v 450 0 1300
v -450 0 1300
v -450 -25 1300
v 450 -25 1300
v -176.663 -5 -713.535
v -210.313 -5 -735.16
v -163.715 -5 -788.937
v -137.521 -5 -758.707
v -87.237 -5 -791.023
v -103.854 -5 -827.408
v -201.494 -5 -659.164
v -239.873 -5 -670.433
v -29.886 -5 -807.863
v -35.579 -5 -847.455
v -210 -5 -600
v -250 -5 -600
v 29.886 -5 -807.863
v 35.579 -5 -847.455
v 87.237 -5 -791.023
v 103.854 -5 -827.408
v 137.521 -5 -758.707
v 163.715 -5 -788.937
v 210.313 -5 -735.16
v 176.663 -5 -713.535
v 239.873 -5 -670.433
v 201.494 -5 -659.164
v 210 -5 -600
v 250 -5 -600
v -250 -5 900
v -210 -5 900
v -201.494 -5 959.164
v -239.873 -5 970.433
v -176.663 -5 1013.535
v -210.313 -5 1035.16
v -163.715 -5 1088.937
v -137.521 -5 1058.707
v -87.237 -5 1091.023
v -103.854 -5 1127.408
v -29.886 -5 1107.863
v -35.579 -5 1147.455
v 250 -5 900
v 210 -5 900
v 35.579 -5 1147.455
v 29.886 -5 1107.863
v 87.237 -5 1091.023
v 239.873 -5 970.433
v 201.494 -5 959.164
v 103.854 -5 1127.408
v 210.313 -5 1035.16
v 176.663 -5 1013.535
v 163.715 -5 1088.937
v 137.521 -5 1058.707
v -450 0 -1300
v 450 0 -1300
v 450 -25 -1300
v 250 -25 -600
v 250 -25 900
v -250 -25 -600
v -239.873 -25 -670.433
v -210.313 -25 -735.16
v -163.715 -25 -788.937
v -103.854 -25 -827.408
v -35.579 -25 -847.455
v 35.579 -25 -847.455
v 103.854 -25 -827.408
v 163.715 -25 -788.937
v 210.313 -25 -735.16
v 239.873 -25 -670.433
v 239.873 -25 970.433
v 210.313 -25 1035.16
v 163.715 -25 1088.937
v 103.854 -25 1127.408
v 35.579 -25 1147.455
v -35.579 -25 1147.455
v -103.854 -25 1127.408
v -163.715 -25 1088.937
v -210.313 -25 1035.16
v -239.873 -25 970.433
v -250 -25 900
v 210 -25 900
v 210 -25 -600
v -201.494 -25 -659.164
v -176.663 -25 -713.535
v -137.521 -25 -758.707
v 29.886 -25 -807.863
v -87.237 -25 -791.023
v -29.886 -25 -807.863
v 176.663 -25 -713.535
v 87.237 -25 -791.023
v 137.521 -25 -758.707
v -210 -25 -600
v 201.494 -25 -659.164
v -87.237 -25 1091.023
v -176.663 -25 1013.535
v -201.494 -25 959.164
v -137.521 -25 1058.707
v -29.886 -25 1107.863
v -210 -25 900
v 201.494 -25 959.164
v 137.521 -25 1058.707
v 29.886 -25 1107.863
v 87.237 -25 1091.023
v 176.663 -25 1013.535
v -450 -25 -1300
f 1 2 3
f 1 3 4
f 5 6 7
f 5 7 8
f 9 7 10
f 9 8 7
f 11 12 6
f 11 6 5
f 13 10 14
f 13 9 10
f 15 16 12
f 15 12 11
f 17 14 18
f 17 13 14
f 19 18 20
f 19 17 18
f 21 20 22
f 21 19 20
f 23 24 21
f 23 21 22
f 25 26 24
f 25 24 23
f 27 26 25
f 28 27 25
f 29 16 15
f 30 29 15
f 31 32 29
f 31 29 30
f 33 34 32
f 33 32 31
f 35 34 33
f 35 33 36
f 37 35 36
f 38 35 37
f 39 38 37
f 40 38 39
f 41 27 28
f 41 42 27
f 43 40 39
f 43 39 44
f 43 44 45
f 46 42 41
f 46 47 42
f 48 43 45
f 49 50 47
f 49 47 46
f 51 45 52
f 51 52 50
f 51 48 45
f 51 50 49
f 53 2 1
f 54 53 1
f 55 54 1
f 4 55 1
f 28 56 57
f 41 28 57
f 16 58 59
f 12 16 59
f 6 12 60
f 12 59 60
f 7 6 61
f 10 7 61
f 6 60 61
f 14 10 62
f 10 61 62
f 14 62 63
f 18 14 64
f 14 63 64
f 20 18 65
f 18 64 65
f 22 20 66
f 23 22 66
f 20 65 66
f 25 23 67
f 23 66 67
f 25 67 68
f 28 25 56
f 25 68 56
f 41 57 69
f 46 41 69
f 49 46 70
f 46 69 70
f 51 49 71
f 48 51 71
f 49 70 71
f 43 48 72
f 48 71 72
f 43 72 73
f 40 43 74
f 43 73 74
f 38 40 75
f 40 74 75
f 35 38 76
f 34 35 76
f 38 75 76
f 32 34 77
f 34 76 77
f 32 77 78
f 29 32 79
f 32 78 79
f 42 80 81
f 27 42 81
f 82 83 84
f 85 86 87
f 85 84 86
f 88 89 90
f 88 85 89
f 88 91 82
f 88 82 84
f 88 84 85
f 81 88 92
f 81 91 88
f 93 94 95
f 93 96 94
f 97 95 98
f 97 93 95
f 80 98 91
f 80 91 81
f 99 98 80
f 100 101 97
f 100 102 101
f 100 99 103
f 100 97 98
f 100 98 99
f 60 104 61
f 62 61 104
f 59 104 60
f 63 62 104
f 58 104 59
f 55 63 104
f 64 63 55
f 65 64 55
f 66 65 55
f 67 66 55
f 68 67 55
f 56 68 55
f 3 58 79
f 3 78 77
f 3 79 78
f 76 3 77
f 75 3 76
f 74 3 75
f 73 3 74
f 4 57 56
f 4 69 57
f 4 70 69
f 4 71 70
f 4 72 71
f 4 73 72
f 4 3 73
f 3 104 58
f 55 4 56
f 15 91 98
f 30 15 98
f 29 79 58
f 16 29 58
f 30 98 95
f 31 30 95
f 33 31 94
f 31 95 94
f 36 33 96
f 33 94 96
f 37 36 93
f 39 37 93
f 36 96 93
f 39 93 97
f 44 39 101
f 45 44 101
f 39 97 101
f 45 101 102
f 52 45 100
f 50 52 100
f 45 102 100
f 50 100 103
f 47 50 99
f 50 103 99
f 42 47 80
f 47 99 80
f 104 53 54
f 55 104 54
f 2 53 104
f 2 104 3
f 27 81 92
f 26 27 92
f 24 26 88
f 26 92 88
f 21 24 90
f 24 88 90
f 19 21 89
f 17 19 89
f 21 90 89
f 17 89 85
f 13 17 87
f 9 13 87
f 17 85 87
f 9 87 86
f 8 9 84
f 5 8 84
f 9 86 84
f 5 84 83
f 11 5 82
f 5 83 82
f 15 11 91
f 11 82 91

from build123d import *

# Parameters (mm, degrees)
F0_W     = 900
F0_H     = 2600
F1_DEPTH = 25
F3_DEPTH = 20


with BuildPart() as f1:
    # F0 (on Front) → F1 (new body)
    with BuildSketch(Plane.XZ):
        Rectangle(F0_W, F0_H)
    extrude(amount=F1_DEPTH)

    # F2 (on face) → F3 (cut)
    with BuildSketch(Plane.XZ.offset(25)):
        with BuildLine():
            Line((250, -600), (250, 900))
            ThreePointArc((250, 900), (0, 1150), (-250, 900))
            Line((-250, 900), (-250, -600))
            ThreePointArc((-250, -600), (0, -850), (250, -600))
        make_face()
        with BuildLine():
            ThreePointArc((-210, 900), (0, 1110), (210, 900))
            Line((210, 900), (210, -600))
            ThreePointArc((210, -600), (0, -810), (-210, -600))
            Line((-210, -600), (-210, 900))
        make_face(mode=Mode.SUBTRACT)
    extrude(amount=-F3_DEPTH, mode=Mode.SUBTRACT)


solid = f1.part
